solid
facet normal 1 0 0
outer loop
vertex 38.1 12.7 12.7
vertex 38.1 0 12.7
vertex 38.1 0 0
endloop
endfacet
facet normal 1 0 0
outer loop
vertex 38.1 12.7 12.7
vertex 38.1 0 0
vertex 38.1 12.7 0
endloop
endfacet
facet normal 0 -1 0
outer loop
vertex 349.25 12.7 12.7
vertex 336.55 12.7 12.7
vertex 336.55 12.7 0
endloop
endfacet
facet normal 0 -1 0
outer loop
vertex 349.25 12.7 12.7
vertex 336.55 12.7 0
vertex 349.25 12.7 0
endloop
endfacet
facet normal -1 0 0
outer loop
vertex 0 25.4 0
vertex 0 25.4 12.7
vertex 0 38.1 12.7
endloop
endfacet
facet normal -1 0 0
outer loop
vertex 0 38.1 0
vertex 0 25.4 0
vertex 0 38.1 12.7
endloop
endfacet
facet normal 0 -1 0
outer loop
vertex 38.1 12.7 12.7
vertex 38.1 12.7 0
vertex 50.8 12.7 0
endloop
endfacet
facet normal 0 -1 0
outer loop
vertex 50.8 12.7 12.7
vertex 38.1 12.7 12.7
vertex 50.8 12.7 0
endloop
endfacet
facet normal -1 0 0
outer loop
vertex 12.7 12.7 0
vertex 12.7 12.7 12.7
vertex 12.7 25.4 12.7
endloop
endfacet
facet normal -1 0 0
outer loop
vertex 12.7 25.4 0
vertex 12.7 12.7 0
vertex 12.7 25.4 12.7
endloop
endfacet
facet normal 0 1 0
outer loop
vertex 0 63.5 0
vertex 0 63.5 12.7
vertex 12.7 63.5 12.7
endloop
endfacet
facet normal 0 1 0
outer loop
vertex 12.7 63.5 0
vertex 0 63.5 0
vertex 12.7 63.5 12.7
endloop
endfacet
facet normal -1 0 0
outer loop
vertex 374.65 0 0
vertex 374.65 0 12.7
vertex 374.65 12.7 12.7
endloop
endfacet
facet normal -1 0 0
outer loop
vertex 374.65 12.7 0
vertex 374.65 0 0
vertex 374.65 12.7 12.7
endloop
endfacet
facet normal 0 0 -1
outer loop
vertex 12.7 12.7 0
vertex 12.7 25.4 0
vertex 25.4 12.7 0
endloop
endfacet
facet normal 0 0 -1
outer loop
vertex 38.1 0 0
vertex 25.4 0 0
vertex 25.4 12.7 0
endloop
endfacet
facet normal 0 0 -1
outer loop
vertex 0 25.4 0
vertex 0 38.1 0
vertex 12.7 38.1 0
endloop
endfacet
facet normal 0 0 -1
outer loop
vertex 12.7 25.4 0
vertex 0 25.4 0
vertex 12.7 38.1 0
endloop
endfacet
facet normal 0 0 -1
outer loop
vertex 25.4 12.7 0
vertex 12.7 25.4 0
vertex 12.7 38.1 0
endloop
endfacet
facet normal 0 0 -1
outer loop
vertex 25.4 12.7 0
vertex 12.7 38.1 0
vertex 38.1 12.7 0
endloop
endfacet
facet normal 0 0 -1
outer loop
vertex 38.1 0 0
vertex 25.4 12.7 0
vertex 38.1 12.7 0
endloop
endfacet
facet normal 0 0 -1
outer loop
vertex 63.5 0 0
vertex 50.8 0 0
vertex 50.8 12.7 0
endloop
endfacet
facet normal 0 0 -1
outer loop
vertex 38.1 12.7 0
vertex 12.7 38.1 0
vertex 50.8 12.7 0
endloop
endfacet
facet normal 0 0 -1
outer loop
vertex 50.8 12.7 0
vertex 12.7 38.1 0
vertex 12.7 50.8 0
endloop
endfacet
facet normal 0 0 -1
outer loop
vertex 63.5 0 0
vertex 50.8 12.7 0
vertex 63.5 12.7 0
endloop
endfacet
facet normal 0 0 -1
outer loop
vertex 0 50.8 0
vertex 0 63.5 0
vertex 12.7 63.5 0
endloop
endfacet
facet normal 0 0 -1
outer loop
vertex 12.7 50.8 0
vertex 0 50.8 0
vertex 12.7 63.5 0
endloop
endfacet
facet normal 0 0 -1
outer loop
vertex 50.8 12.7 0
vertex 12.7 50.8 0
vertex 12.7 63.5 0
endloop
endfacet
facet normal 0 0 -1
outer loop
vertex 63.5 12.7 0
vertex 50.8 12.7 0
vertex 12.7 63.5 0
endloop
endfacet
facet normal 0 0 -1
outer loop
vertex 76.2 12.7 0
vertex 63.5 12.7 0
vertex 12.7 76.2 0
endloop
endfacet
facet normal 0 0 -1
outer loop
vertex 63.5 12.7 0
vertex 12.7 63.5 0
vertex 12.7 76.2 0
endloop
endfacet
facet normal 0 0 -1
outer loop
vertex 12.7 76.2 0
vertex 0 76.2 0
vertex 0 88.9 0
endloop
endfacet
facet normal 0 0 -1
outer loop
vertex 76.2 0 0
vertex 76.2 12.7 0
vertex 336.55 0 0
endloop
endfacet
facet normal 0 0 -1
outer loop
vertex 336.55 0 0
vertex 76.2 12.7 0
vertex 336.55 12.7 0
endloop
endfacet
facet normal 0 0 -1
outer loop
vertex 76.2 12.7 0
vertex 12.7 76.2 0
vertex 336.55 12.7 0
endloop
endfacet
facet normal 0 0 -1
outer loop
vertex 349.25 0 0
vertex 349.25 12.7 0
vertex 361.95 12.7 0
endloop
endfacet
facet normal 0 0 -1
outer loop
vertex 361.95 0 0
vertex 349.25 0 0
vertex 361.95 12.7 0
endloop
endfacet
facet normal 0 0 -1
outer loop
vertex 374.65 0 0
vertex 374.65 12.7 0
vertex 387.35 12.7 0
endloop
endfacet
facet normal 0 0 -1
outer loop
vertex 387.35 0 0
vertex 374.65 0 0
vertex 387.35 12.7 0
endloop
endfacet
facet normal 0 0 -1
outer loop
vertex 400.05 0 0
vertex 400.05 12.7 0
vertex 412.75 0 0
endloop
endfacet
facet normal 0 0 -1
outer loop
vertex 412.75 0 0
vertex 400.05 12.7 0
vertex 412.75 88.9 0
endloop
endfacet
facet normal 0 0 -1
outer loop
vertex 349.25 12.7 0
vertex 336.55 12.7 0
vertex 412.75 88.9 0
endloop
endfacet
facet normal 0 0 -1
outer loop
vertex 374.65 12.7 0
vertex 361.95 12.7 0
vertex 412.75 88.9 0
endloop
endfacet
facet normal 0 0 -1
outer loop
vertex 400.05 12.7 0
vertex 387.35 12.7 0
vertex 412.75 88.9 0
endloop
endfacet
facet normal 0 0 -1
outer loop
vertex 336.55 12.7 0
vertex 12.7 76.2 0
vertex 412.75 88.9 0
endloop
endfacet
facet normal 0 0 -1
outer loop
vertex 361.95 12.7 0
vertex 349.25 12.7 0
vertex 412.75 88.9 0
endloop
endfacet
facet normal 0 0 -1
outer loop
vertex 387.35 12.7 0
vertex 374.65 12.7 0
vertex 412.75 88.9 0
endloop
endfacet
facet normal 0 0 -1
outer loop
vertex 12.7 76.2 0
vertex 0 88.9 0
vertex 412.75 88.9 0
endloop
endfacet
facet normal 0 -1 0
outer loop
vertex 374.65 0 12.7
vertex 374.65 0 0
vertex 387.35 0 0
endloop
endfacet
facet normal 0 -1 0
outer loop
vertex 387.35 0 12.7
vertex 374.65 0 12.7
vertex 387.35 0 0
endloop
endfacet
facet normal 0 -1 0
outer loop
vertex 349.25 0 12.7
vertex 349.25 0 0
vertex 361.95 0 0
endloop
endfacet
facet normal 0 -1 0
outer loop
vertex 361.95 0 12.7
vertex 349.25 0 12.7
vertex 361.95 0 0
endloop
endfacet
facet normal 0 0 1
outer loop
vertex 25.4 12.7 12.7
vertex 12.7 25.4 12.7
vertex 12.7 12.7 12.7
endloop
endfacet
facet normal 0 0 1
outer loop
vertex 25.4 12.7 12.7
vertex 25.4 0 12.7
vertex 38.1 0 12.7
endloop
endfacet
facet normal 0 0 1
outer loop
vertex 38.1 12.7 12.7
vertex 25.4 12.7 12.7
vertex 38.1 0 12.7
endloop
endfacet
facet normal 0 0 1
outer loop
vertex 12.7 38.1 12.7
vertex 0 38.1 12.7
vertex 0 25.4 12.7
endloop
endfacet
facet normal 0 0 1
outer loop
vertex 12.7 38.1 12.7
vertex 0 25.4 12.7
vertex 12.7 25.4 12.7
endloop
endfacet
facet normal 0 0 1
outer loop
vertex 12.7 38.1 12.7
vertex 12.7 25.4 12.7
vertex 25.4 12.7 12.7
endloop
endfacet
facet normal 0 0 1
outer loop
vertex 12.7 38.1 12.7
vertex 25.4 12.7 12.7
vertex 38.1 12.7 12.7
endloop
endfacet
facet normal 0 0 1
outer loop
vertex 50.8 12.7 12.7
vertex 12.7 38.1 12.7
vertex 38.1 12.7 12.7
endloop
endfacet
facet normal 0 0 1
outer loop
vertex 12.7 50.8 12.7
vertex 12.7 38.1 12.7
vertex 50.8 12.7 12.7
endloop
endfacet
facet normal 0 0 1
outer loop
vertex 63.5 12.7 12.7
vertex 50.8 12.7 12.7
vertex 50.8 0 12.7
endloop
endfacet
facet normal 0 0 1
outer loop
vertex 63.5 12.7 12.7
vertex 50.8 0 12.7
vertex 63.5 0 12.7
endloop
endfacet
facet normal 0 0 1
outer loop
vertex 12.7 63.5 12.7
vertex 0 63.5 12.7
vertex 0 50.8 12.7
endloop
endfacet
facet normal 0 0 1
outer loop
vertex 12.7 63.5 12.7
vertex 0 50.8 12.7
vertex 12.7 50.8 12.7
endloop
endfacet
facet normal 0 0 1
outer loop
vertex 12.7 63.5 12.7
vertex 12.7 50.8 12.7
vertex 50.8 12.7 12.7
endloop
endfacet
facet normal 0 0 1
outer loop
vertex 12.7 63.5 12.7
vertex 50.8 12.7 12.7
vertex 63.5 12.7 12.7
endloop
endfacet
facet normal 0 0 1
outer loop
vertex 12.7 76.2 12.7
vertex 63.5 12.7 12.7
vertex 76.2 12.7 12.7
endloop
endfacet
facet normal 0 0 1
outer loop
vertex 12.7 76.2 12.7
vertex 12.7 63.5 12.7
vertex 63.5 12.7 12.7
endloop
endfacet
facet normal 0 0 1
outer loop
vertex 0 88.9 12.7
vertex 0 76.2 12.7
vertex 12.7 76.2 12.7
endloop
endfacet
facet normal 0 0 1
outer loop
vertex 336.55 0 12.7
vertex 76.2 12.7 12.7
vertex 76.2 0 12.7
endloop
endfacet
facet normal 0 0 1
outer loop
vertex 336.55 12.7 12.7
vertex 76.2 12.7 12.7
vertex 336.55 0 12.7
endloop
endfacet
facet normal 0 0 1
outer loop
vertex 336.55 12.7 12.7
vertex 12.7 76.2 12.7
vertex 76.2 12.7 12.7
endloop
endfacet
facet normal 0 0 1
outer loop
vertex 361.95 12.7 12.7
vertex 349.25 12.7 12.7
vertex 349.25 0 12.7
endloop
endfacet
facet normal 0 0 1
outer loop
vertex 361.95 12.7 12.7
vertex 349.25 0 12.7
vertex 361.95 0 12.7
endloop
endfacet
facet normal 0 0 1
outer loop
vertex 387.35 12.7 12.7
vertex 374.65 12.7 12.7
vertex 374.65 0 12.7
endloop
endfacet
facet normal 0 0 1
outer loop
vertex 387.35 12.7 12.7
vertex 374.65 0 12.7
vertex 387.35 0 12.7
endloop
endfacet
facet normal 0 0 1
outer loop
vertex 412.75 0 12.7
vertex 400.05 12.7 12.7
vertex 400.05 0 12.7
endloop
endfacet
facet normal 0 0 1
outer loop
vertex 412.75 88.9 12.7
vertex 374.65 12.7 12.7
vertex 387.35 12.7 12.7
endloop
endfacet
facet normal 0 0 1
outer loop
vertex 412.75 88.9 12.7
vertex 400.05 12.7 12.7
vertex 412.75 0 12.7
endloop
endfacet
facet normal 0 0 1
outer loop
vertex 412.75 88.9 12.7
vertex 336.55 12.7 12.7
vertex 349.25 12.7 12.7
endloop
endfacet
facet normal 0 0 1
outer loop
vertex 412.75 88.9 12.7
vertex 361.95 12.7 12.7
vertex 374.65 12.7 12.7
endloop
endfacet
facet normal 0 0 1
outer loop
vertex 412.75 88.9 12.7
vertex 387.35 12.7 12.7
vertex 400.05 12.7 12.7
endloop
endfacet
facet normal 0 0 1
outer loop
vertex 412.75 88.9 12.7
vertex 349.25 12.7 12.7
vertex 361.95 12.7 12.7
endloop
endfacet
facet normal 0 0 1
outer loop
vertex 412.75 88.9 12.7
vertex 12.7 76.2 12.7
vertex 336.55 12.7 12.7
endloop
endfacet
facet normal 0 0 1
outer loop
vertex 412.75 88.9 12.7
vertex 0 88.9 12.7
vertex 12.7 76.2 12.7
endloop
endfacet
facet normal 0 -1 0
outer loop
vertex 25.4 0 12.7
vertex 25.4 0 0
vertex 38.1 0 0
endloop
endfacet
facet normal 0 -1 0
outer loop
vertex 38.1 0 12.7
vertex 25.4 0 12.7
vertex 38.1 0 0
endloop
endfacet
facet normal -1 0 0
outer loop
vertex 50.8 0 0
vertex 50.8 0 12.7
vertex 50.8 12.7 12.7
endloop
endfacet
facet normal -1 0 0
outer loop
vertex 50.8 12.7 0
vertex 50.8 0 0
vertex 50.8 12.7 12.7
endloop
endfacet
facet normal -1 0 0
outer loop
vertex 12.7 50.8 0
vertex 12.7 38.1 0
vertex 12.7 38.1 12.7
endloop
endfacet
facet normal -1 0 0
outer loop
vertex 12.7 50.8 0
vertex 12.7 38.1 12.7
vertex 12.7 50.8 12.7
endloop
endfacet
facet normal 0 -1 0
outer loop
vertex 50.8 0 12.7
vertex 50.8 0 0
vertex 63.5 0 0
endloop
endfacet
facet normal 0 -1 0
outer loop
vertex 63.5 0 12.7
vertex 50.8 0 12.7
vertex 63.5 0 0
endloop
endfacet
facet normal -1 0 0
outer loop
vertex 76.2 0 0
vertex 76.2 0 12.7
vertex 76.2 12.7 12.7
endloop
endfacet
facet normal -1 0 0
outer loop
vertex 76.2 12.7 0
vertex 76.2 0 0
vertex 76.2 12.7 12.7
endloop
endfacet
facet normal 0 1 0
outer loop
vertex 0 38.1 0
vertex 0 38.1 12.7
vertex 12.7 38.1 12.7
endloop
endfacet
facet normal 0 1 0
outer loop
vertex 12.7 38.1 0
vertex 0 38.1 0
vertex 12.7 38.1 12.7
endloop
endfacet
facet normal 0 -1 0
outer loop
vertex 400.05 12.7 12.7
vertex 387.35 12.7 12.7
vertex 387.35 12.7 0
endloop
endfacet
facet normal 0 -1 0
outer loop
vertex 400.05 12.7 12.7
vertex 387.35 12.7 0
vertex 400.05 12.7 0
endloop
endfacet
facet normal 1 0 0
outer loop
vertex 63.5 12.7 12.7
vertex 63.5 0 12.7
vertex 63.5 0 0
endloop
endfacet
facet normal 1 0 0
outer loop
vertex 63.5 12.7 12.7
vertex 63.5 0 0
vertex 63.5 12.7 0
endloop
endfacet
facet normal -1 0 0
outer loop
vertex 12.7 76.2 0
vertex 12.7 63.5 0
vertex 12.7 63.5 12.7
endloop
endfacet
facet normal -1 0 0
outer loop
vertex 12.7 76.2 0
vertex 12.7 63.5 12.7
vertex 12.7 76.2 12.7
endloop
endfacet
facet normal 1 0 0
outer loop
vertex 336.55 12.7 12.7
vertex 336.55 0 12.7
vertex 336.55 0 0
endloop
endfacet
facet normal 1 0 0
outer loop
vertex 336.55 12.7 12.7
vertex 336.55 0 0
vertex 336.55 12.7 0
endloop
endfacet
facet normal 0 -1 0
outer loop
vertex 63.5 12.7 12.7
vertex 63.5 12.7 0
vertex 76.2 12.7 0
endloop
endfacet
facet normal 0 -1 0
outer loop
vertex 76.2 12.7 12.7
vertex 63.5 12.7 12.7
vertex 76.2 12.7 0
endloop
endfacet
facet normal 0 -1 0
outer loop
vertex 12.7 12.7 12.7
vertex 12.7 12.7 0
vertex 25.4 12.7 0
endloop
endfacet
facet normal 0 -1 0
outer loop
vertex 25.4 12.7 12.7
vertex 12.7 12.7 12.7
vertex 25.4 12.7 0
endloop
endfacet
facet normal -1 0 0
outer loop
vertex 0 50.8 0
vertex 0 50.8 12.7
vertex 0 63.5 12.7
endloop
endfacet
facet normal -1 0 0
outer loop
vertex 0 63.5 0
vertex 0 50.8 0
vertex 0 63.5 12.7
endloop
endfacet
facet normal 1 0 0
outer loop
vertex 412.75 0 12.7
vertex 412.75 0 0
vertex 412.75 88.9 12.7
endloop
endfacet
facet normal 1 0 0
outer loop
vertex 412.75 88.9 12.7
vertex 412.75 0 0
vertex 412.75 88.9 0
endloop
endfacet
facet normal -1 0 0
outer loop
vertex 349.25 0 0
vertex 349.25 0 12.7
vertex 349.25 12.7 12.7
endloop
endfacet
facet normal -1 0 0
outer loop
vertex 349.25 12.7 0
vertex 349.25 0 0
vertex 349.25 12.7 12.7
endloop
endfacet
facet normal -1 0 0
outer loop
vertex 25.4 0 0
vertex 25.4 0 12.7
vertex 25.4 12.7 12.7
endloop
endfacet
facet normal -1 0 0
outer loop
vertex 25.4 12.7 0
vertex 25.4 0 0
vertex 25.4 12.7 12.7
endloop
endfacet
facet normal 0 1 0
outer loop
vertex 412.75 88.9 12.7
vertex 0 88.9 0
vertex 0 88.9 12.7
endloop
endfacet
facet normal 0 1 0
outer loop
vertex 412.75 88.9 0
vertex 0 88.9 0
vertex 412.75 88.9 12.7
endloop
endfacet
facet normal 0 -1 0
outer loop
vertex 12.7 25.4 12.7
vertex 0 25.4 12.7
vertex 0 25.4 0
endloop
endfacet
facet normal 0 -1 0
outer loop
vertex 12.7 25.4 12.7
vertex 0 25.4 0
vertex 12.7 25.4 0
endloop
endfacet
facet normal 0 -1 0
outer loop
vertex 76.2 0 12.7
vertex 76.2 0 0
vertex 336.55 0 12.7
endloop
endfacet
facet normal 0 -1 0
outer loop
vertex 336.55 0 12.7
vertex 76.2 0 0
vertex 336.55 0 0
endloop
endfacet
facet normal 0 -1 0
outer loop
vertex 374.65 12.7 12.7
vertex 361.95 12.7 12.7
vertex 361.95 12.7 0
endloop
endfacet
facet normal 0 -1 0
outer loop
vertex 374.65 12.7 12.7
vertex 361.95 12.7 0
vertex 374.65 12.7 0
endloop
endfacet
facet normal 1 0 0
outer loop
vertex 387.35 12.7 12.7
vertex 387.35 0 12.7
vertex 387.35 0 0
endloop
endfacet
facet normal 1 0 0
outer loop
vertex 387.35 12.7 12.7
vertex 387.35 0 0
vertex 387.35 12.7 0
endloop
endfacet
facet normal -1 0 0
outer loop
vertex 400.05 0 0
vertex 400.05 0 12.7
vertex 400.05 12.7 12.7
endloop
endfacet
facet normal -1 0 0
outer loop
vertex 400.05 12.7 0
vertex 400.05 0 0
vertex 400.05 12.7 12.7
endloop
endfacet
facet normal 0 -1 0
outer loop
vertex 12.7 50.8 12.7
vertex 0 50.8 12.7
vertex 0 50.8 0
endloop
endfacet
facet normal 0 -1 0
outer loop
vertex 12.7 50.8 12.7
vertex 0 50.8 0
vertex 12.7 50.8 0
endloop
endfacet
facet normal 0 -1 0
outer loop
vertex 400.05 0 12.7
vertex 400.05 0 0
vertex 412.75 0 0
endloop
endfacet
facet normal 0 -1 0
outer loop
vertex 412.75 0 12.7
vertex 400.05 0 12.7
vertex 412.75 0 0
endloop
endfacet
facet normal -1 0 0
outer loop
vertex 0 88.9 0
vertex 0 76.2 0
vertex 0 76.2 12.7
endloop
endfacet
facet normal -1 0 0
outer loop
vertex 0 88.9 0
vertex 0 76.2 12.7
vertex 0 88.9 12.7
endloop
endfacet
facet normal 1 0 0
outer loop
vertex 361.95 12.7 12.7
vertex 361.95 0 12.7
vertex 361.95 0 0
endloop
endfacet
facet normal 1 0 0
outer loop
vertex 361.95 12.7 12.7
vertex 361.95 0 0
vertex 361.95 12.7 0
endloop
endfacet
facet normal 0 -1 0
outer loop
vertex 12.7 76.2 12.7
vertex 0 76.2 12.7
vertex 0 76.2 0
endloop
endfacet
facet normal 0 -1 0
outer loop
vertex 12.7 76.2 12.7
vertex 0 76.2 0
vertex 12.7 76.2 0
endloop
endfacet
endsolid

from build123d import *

# Parameters (mm, degrees)
F0_W     = 412.75
F0_H     = 88.9
F1_DEPTH = 12.7
F2_W     = 12.7
F2_H     = 25.4
F2_H_2   = 12.7
F3_DEPTH = 25.4
F4_W     = 12.7
F4_H     = 12.7
F5_DEPTH = 25.4
F6_W     = 12.7
F6_H     = 12.7
F7_DEPTH = 25.4


with BuildPart() as f1:
    # F0 (on Top) → F1 (new body)
    with BuildSketch(Plane.XY):
        with Locations((206.375, 44.45)):
            Rectangle(F0_W, F0_H)
    extrude(amount=F1_DEPTH)

    # F2 (on face) → F3 (cut)
    with BuildSketch(Plane.XY.offset(12.7)):
        with Locations((6.35, 12.7)):
            Rectangle(F2_W, F2_H)
        with Locations((6.35, 69.85)):
            Rectangle(F2_W, F2_H_2)
        with Locations((6.35, 44.45)):
            Rectangle(F2_W, F2_H_2)
    extrude(amount=-F3_DEPTH, mode=Mode.SUBTRACT)

    # F4 (on face) → F5 (cut)
    with BuildSketch(Plane.XY.offset(12.7)):
        with Locations((393.7, 6.35)):
            Rectangle(F4_W, F4_H)
        with Locations((368.3, 6.35)):
            Rectangle(F4_W, F4_H)
        with Locations((342.9, 6.35)):
            Rectangle(F4_W, F4_H)
    extrude(amount=-F5_DEPTH, mode=Mode.SUBTRACT)

    # F6 (on face) → F7 (cut)
    with BuildSketch(Plane.XY.offset(12.7)):
        with Locations((19.05, 6.35)):
            Rectangle(F6_W, F6_H)
        with Locations((44.45, 6.35)):
            Rectangle(F6_W, F6_H)
        with Locations((69.85, 6.35)):
            Rectangle(F6_W, F6_H)
    extrude(amount=-F7_DEPTH, mode=Mode.SUBTRACT)


solid = f1.part
